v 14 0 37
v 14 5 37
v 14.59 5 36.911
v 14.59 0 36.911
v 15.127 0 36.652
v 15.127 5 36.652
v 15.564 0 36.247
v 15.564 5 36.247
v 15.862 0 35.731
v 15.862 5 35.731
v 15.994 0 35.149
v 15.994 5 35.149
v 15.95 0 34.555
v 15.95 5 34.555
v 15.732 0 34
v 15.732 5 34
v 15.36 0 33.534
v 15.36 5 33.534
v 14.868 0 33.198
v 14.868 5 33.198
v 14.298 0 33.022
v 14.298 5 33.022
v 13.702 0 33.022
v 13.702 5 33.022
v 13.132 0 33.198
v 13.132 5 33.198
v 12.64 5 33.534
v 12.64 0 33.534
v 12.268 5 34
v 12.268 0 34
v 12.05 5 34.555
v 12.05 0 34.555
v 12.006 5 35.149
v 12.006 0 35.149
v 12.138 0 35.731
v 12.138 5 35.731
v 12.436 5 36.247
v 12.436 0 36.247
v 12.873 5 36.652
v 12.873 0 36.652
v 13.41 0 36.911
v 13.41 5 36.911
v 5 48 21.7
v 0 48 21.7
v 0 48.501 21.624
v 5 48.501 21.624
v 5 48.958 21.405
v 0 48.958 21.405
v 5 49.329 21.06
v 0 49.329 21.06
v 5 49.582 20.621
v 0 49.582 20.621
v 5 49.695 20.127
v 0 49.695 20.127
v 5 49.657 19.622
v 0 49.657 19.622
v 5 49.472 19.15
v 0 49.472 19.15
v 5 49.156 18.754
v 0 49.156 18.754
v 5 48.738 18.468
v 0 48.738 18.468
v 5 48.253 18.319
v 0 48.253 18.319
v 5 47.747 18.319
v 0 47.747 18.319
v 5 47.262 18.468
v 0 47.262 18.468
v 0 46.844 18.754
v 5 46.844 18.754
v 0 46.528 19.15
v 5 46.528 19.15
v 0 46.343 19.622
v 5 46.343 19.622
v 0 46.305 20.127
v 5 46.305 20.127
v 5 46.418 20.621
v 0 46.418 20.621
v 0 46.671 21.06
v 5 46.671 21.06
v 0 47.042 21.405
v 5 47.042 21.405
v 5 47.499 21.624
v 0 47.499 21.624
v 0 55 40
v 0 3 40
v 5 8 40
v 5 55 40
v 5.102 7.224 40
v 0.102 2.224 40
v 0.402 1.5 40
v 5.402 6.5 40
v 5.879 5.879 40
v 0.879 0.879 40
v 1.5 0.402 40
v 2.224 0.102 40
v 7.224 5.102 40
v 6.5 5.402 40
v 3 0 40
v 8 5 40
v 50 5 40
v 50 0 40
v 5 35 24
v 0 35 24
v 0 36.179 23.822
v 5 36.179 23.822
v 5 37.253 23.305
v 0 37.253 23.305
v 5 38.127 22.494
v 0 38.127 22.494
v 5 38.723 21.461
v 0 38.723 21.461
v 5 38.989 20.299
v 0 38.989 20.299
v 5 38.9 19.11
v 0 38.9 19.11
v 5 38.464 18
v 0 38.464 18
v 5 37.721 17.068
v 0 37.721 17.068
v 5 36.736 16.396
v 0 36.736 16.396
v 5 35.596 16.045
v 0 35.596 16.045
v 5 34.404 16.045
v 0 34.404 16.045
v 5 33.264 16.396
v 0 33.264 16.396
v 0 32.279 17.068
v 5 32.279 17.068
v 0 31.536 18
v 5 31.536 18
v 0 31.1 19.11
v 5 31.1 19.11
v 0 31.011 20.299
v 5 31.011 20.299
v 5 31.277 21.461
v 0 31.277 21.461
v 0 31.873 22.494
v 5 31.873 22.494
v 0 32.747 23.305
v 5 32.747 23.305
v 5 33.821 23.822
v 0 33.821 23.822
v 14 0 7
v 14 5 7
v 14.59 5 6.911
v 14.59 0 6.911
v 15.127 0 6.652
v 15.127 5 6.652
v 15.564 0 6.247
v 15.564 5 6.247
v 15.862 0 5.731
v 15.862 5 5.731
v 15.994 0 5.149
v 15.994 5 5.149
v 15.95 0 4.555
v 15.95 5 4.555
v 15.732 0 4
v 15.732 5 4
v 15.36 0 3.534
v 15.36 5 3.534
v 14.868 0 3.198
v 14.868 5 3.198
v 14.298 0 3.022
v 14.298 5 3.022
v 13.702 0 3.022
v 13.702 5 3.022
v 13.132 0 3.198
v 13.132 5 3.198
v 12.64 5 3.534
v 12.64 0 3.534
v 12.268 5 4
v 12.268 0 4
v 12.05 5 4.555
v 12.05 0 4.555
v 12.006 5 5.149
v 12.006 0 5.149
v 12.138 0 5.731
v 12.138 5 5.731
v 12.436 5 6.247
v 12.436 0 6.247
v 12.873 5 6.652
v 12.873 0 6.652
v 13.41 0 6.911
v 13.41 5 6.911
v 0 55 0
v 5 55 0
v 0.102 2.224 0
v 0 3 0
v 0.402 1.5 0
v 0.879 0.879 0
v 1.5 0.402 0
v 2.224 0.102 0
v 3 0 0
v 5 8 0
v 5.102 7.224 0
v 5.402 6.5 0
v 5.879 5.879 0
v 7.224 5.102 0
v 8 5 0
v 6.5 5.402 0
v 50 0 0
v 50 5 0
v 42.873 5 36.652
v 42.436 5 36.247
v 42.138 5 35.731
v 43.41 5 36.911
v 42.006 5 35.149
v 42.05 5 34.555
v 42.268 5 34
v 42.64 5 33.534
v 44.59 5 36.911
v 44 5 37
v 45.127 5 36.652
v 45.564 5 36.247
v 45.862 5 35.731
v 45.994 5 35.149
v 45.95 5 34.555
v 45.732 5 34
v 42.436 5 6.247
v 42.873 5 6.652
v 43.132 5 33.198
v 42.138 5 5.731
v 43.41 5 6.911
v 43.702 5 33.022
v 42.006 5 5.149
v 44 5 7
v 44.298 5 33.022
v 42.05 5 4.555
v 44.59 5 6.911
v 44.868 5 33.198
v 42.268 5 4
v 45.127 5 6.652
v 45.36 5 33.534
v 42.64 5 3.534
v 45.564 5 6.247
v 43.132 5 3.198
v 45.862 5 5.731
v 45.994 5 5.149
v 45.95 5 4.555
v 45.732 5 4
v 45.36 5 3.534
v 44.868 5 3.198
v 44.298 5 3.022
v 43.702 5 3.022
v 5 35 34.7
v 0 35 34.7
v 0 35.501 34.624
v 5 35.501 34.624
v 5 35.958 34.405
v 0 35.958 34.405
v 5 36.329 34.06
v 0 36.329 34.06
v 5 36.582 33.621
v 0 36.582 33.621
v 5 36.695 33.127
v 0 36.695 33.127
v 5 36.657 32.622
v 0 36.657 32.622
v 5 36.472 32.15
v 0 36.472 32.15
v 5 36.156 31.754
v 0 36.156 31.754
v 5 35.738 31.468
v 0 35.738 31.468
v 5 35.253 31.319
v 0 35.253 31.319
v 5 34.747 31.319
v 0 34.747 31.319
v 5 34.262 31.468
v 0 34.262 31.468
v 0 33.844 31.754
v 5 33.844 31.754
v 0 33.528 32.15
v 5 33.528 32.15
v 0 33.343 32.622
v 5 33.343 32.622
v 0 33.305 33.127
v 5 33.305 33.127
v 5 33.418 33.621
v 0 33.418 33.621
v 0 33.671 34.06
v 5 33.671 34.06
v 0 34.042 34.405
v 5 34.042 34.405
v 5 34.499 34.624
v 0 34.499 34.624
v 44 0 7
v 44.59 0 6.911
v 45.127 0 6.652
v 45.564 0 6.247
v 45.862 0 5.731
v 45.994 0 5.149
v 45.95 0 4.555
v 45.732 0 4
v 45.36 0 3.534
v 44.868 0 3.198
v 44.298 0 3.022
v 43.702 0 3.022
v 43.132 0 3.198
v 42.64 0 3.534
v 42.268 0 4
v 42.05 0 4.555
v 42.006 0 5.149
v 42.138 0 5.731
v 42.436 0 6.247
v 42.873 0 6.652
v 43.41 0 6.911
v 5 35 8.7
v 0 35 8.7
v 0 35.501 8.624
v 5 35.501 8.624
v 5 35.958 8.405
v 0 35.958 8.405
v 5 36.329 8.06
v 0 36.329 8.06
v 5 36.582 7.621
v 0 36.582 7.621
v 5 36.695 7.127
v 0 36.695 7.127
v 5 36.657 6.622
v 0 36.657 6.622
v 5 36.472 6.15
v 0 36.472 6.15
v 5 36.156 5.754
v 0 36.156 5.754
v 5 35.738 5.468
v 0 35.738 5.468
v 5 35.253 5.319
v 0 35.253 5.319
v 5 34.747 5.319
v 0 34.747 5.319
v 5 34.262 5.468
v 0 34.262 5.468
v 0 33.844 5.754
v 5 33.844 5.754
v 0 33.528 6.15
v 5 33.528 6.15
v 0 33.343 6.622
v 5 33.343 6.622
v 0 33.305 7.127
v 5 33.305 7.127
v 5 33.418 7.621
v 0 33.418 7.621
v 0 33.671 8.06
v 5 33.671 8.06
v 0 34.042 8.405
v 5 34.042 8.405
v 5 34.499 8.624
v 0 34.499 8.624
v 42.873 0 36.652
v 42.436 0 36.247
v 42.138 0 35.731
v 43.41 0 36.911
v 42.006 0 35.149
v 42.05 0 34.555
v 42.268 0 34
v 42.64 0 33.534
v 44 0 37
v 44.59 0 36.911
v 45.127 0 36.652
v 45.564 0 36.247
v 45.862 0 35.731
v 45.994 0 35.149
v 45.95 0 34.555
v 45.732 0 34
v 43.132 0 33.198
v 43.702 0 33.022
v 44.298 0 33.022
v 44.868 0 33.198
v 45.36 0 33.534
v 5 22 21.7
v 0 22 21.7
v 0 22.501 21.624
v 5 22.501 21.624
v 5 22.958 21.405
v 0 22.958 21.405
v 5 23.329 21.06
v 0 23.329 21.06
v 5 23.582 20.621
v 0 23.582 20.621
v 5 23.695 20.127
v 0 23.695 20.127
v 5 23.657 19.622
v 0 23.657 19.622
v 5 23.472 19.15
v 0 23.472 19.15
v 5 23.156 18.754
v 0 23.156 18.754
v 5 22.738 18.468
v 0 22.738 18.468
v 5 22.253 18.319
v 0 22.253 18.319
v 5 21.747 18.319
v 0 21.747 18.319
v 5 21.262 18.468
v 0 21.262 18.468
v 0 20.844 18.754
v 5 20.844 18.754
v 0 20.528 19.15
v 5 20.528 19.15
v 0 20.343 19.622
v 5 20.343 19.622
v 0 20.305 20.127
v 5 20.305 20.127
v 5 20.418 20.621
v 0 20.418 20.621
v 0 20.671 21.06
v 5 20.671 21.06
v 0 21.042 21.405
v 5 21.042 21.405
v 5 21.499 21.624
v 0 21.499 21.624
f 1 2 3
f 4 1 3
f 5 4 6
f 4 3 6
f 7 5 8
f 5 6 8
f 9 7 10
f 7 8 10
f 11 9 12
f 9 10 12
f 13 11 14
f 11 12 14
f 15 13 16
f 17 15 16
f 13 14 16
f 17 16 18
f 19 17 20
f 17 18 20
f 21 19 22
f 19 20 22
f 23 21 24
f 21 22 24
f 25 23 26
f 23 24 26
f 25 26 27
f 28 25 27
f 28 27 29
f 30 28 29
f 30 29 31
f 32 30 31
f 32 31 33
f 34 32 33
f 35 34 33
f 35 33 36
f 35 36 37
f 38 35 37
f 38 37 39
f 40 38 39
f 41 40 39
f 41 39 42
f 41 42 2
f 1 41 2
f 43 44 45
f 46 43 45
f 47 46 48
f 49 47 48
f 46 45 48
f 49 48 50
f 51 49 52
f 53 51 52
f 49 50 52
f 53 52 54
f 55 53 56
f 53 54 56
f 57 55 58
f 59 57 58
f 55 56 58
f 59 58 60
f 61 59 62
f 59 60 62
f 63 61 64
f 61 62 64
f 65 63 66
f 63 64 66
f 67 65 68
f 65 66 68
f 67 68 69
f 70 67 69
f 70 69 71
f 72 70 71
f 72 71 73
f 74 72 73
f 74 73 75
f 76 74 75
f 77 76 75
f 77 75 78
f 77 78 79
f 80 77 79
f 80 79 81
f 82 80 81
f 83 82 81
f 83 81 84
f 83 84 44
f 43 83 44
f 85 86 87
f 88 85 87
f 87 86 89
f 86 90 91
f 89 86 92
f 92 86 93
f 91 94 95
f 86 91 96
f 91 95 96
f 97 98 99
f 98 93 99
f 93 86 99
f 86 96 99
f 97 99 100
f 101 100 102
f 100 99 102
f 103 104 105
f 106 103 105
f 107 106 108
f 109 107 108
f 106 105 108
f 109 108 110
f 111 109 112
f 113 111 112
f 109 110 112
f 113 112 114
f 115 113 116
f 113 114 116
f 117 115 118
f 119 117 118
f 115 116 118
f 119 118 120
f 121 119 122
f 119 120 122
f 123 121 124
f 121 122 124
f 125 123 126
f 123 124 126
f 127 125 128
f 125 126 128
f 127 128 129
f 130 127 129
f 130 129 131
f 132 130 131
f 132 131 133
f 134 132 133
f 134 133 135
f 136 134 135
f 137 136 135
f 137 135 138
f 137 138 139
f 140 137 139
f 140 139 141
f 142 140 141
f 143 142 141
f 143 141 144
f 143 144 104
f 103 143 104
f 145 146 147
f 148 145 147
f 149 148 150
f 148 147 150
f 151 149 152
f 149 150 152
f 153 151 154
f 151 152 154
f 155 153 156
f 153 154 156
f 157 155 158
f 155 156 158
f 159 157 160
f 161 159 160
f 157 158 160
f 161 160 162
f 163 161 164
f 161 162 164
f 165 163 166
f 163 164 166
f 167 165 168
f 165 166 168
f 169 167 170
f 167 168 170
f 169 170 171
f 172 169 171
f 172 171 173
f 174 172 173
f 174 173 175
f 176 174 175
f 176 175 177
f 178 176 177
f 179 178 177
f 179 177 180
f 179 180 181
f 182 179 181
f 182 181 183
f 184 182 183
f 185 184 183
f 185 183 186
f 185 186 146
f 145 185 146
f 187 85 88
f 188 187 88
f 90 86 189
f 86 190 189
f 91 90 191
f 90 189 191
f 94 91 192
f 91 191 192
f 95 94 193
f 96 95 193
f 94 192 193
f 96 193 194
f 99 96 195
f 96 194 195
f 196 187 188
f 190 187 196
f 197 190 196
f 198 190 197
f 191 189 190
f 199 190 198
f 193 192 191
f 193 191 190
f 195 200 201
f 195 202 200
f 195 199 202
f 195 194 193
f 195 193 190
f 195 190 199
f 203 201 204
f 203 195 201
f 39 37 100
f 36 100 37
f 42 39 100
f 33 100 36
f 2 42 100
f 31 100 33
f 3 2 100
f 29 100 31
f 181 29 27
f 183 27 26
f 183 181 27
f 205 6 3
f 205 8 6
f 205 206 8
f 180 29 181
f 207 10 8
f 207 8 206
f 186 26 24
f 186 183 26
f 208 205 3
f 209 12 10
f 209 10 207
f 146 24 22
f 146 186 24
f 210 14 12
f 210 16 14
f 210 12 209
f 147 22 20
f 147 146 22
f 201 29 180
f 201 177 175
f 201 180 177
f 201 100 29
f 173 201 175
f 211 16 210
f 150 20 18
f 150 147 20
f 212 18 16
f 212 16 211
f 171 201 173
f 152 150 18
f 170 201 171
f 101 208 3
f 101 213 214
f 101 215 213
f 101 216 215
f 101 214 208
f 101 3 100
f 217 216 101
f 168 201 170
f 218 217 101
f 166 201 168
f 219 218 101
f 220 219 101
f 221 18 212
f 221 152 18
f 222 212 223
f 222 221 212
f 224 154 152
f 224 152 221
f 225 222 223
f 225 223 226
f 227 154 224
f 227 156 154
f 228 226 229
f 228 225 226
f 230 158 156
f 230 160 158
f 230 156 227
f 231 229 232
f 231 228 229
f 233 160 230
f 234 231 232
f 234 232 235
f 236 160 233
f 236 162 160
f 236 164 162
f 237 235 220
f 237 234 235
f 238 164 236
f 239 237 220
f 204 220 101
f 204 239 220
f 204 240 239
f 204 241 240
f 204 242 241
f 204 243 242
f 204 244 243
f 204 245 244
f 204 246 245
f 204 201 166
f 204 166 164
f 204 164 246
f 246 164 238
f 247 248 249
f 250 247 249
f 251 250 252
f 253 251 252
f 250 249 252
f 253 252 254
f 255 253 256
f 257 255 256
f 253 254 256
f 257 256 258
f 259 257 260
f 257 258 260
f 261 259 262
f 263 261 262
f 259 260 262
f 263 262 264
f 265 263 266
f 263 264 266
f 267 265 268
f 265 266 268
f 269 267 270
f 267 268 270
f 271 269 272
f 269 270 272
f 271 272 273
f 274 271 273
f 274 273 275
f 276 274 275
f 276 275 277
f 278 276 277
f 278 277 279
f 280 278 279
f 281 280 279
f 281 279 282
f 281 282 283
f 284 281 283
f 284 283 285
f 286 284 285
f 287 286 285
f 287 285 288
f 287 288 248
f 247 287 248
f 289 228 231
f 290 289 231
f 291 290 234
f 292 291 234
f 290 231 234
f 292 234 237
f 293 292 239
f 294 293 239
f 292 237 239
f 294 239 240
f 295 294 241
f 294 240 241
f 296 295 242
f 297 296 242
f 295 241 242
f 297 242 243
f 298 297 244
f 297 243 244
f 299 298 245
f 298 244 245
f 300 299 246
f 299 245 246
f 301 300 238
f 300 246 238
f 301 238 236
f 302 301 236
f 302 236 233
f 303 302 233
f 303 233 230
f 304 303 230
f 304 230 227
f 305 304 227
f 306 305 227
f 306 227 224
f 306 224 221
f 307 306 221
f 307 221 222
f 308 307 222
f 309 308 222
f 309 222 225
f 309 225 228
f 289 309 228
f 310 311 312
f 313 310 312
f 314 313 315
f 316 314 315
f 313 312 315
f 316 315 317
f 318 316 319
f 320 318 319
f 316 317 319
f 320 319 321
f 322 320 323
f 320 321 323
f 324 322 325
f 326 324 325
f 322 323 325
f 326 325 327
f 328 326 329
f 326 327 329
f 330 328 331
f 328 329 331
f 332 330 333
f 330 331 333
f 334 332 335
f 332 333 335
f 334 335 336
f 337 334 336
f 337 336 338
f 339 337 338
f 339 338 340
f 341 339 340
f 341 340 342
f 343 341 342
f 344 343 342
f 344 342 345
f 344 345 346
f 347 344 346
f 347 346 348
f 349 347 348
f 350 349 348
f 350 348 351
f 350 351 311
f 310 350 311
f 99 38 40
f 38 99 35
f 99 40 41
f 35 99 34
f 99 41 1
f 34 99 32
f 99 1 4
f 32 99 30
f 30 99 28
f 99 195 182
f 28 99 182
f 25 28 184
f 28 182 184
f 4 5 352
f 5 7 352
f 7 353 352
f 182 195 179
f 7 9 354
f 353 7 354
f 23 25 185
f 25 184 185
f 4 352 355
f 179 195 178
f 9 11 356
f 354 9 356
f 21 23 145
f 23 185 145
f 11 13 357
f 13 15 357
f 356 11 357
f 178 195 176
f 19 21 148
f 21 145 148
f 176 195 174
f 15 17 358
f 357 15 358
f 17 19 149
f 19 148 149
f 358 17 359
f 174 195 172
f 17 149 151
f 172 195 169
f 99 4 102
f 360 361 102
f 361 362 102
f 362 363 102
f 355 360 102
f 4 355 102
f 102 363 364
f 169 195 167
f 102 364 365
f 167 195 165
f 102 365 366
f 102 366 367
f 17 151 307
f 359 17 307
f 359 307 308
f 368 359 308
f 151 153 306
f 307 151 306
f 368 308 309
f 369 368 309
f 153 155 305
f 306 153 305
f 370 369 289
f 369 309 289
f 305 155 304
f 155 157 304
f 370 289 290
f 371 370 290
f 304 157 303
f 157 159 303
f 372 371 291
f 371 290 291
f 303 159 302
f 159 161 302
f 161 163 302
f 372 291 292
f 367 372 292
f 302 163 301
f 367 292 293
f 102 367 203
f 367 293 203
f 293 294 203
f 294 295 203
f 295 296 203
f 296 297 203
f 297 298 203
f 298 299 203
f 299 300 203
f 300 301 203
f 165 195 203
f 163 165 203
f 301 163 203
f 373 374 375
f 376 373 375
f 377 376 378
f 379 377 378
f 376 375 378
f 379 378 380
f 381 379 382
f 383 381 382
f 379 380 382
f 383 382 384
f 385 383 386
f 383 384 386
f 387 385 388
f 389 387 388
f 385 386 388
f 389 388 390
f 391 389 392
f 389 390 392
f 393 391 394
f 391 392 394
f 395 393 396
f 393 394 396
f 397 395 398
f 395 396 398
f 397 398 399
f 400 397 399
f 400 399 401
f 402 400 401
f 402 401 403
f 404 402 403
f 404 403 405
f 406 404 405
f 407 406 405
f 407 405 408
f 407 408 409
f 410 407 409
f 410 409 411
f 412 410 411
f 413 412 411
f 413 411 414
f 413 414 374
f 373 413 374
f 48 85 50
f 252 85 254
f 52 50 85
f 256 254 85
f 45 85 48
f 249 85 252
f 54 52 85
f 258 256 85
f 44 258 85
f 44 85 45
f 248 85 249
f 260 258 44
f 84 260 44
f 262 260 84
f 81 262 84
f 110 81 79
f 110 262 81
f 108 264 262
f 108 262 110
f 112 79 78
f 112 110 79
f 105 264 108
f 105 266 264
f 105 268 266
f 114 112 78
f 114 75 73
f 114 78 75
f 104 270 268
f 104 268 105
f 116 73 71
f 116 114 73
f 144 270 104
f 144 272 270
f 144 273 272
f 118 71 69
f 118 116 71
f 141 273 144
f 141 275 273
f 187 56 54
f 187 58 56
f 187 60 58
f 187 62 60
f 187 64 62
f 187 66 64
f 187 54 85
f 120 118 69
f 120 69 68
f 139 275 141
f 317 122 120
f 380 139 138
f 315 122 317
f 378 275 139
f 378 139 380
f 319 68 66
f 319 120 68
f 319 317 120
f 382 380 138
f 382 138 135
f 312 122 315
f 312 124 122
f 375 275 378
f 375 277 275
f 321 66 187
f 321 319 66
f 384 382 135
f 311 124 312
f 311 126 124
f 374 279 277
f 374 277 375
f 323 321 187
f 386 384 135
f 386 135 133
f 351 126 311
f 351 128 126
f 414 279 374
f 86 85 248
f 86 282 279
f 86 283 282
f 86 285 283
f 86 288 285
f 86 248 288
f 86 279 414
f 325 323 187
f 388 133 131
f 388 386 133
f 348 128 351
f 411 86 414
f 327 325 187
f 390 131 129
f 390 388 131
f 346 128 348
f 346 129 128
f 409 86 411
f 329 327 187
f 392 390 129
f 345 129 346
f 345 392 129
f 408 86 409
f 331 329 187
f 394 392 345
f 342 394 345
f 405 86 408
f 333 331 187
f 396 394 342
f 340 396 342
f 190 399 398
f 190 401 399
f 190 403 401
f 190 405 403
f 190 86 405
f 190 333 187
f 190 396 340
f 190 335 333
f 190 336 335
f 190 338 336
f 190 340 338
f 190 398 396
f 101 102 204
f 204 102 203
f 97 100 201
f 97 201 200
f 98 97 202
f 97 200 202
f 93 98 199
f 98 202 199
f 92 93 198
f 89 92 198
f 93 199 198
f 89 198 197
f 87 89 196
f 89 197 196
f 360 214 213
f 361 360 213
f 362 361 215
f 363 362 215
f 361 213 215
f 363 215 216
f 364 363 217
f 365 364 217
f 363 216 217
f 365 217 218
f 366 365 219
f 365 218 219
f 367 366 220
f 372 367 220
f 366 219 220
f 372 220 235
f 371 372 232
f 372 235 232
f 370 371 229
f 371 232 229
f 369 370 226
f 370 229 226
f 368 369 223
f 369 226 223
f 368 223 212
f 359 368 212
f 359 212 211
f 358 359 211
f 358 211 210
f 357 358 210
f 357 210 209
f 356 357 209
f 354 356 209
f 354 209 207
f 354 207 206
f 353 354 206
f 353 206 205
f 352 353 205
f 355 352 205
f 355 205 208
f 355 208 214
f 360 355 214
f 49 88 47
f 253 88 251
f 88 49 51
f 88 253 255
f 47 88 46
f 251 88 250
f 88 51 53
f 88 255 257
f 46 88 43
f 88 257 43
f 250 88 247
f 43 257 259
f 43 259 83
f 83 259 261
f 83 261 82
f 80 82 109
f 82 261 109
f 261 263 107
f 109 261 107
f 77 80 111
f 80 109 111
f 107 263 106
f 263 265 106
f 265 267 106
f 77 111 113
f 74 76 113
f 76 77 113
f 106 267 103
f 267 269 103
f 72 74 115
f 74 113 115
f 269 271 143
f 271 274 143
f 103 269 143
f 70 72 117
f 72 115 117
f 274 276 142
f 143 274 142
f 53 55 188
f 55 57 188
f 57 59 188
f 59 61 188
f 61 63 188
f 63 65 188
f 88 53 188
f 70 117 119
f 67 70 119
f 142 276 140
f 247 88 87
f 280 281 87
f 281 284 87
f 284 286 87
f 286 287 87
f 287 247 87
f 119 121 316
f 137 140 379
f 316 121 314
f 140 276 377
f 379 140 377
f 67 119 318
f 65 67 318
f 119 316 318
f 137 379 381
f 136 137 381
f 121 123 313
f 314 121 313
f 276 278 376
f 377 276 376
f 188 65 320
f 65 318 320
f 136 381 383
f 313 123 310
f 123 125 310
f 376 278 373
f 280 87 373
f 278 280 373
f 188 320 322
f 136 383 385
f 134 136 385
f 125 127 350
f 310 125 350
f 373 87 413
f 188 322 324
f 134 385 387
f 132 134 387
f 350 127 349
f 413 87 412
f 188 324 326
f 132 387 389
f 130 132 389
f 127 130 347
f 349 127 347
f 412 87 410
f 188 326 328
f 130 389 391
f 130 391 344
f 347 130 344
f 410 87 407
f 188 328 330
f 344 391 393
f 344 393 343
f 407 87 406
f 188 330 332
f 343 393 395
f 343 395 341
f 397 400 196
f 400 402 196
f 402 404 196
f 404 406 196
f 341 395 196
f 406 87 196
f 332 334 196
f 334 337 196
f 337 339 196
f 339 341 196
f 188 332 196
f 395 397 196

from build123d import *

# Parameters (mm, degrees)
SKETCH1_W           = 50
SKETCH1_H           = 40
BOSS_EXTRUDE1_DEPTH = 5
SKETCH2_W           = 5
SKETCH2_H           = 40
BOSS_EXTRUDE2_DEPTH = 50
FILLET1_R           = 3
CUT_EXTRUDE1_REACH  = 86.41
SKETCH3_R           = 4
CUT_EXTRUDE2_REACH  = 86.41
SKETCH5_R           = 1.7
CUT_EXTRUDE3_REACH  = 83.24
SKETCH6_R           = 2


with BuildPart() as part:
    # Sketch1 → Boss-Extrude1 (new body)
    with BuildSketch(Plane(origin=(0, 0, 0), x_dir=(1, 0, 0), z_dir=(0, 1, 0))):
        with Locations((25, -20)):
            Rectangle(SKETCH1_W, SKETCH1_H)
    extrude(amount=BOSS_EXTRUDE1_DEPTH)

    # Sketch2 → Boss-Extrude2 (add)
    with BuildSketch(Plane(origin=(0, 5, 0), x_dir=(1, 0, 0), z_dir=(0, 1, 0))):
        with Locations((2.5, -20)):
            Rectangle(SKETCH2_W, SKETCH2_H)
    extrude(amount=BOSS_EXTRUDE2_DEPTH)

    # Fillet1
    fillet1_edges = [part.edges().sort_by_distance(p)[0] for p in [
        (5, 5, 20),
        (0, 0, 20),
    ]]
    fillet(fillet1_edges, radius=FILLET1_R)

    # Sketch3 → Cut-Extrude1 (cut, up to next)
    with BuildSketch(Plane.ZY, mode=Mode.PRIVATE) as cut_extrude1_sk1:
        with Locations((20, 35)):
            Circle(SKETCH3_R)
    cut_extrude1_tool1 = extrude(cut_extrude1_sk1.sketch, amount=-CUT_EXTRUDE1_REACH, mode=Mode.PRIVATE) & part.part
    add(cut_extrude1_tool1.solids().sort_by_distance((0, 35, 20))[0], mode=Mode.SUBTRACT)

    # Sketch5 → Cut-Extrude2 (cut, up to next)
    with BuildSketch(Plane.ZY, mode=Mode.PRIVATE) as cut_extrude2_sk1:
        with Locations((7, 35)):
            Circle(SKETCH5_R)
    cut_extrude2_tool1 = extrude(cut_extrude2_sk1.sketch, amount=-CUT_EXTRUDE2_REACH, mode=Mode.PRIVATE) & part.part
    # Sketch5 → Cut-Extrude2 (cut, up to next)
    with BuildSketch(Plane.ZY, mode=Mode.PRIVATE) as cut_extrude2_sk2:
        with Locations((33, 35)):
            Circle(SKETCH5_R)
    cut_extrude2_tool2 = extrude(cut_extrude2_sk2.sketch, amount=-CUT_EXTRUDE2_REACH, mode=Mode.PRIVATE) & part.part
    # Sketch5 → Cut-Extrude2 (cut, up to next)
    with BuildSketch(Plane.ZY, mode=Mode.PRIVATE) as cut_extrude2_sk3:
        with Locations((20, 48)):
            Circle(SKETCH5_R)
    cut_extrude2_tool3 = extrude(cut_extrude2_sk3.sketch, amount=-CUT_EXTRUDE2_REACH, mode=Mode.PRIVATE) & part.part
    # Sketch5 → Cut-Extrude2 (cut, up to next)
    with BuildSketch(Plane.ZY, mode=Mode.PRIVATE) as cut_extrude2_sk4:
        with Locations((20, 22)):
            Circle(SKETCH5_R)
    cut_extrude2_tool4 = extrude(cut_extrude2_sk4.sketch, amount=-CUT_EXTRUDE2_REACH, mode=Mode.PRIVATE) & part.part
    add(cut_extrude2_tool1.solids().sort_by_distance((0, 35, 7))[0], mode=Mode.SUBTRACT)
    add(cut_extrude2_tool2.solids().sort_by_distance((0, 35, 33))[0], mode=Mode.SUBTRACT)
    add(cut_extrude2_tool3.solids().sort_by_distance((0, 48, 20))[0], mode=Mode.SUBTRACT)
    add(cut_extrude2_tool4.solids().sort_by_distance((0, 22, 20))[0], mode=Mode.SUBTRACT)

    # Sketch6 → Cut-Extrude3 (cut, up to next)
    with BuildSketch(Plane(origin=(0, 5, 0), x_dir=(1, 0, 0), z_dir=(0, 1, 0)), mode=Mode.PRIVATE) as cut_extrude3_sk1:
        with Locations(Location((14, -5, 0), (0, 0, 270))):
            Circle(SKETCH6_R)
    cut_extrude3_tool1 = extrude(cut_extrude3_sk1.sketch, amount=-CUT_EXTRUDE3_REACH, mode=Mode.PRIVATE) & part.part
    # Sketch6 → Cut-Extrude3 (cut, up to next)
    with BuildSketch(Plane(origin=(0, 5, 0), x_dir=(1, 0, 0), z_dir=(0, 1, 0)), mode=Mode.PRIVATE) as cut_extrude3_sk2:
        with Locations(Location((14, -35, 0), (0, 0, 270))):
            Circle(SKETCH6_R)
    cut_extrude3_tool2 = extrude(cut_extrude3_sk2.sketch, amount=-CUT_EXTRUDE3_REACH, mode=Mode.PRIVATE) & part.part
    # Sketch6 → Cut-Extrude3 (cut, up to next)
    with BuildSketch(Plane(origin=(0, 5, 0), x_dir=(1, 0, 0), z_dir=(0, 1, 0)), mode=Mode.PRIVATE) as cut_extrude3_sk3:
        with Locations(Location((44, -5, 0), (0, 0, 270))):
            Circle(SKETCH6_R)
    cut_extrude3_tool3 = extrude(cut_extrude3_sk3.sketch, amount=-CUT_EXTRUDE3_REACH, mode=Mode.PRIVATE) & part.part
    # Sketch6 → Cut-Extrude3 (cut, up to next)
    with BuildSketch(Plane(origin=(0, 5, 0), x_dir=(1, 0, 0), z_dir=(0, 1, 0)), mode=Mode.PRIVATE) as cut_extrude3_sk4:
        with Locations(Location((44, -35, 0), (0, 0, 270))):
            Circle(SKETCH6_R)
    cut_extrude3_tool4 = extrude(cut_extrude3_sk4.sketch, amount=-CUT_EXTRUDE3_REACH, mode=Mode.PRIVATE) & part.part
    add(cut_extrude3_tool1.solids().sort_by_distance((14, 5, 5))[0], mode=Mode.SUBTRACT)
    add(cut_extrude3_tool2.solids().sort_by_distance((14, 5, 35))[0], mode=Mode.SUBTRACT)
    add(cut_extrude3_tool3.solids().sort_by_distance((44, 5, 5))[0], mode=Mode.SUBTRACT)
    add(cut_extrude3_tool4.solids().sort_by_distance((44, 5, 35))[0], mode=Mode.SUBTRACT)


solid = part.part
